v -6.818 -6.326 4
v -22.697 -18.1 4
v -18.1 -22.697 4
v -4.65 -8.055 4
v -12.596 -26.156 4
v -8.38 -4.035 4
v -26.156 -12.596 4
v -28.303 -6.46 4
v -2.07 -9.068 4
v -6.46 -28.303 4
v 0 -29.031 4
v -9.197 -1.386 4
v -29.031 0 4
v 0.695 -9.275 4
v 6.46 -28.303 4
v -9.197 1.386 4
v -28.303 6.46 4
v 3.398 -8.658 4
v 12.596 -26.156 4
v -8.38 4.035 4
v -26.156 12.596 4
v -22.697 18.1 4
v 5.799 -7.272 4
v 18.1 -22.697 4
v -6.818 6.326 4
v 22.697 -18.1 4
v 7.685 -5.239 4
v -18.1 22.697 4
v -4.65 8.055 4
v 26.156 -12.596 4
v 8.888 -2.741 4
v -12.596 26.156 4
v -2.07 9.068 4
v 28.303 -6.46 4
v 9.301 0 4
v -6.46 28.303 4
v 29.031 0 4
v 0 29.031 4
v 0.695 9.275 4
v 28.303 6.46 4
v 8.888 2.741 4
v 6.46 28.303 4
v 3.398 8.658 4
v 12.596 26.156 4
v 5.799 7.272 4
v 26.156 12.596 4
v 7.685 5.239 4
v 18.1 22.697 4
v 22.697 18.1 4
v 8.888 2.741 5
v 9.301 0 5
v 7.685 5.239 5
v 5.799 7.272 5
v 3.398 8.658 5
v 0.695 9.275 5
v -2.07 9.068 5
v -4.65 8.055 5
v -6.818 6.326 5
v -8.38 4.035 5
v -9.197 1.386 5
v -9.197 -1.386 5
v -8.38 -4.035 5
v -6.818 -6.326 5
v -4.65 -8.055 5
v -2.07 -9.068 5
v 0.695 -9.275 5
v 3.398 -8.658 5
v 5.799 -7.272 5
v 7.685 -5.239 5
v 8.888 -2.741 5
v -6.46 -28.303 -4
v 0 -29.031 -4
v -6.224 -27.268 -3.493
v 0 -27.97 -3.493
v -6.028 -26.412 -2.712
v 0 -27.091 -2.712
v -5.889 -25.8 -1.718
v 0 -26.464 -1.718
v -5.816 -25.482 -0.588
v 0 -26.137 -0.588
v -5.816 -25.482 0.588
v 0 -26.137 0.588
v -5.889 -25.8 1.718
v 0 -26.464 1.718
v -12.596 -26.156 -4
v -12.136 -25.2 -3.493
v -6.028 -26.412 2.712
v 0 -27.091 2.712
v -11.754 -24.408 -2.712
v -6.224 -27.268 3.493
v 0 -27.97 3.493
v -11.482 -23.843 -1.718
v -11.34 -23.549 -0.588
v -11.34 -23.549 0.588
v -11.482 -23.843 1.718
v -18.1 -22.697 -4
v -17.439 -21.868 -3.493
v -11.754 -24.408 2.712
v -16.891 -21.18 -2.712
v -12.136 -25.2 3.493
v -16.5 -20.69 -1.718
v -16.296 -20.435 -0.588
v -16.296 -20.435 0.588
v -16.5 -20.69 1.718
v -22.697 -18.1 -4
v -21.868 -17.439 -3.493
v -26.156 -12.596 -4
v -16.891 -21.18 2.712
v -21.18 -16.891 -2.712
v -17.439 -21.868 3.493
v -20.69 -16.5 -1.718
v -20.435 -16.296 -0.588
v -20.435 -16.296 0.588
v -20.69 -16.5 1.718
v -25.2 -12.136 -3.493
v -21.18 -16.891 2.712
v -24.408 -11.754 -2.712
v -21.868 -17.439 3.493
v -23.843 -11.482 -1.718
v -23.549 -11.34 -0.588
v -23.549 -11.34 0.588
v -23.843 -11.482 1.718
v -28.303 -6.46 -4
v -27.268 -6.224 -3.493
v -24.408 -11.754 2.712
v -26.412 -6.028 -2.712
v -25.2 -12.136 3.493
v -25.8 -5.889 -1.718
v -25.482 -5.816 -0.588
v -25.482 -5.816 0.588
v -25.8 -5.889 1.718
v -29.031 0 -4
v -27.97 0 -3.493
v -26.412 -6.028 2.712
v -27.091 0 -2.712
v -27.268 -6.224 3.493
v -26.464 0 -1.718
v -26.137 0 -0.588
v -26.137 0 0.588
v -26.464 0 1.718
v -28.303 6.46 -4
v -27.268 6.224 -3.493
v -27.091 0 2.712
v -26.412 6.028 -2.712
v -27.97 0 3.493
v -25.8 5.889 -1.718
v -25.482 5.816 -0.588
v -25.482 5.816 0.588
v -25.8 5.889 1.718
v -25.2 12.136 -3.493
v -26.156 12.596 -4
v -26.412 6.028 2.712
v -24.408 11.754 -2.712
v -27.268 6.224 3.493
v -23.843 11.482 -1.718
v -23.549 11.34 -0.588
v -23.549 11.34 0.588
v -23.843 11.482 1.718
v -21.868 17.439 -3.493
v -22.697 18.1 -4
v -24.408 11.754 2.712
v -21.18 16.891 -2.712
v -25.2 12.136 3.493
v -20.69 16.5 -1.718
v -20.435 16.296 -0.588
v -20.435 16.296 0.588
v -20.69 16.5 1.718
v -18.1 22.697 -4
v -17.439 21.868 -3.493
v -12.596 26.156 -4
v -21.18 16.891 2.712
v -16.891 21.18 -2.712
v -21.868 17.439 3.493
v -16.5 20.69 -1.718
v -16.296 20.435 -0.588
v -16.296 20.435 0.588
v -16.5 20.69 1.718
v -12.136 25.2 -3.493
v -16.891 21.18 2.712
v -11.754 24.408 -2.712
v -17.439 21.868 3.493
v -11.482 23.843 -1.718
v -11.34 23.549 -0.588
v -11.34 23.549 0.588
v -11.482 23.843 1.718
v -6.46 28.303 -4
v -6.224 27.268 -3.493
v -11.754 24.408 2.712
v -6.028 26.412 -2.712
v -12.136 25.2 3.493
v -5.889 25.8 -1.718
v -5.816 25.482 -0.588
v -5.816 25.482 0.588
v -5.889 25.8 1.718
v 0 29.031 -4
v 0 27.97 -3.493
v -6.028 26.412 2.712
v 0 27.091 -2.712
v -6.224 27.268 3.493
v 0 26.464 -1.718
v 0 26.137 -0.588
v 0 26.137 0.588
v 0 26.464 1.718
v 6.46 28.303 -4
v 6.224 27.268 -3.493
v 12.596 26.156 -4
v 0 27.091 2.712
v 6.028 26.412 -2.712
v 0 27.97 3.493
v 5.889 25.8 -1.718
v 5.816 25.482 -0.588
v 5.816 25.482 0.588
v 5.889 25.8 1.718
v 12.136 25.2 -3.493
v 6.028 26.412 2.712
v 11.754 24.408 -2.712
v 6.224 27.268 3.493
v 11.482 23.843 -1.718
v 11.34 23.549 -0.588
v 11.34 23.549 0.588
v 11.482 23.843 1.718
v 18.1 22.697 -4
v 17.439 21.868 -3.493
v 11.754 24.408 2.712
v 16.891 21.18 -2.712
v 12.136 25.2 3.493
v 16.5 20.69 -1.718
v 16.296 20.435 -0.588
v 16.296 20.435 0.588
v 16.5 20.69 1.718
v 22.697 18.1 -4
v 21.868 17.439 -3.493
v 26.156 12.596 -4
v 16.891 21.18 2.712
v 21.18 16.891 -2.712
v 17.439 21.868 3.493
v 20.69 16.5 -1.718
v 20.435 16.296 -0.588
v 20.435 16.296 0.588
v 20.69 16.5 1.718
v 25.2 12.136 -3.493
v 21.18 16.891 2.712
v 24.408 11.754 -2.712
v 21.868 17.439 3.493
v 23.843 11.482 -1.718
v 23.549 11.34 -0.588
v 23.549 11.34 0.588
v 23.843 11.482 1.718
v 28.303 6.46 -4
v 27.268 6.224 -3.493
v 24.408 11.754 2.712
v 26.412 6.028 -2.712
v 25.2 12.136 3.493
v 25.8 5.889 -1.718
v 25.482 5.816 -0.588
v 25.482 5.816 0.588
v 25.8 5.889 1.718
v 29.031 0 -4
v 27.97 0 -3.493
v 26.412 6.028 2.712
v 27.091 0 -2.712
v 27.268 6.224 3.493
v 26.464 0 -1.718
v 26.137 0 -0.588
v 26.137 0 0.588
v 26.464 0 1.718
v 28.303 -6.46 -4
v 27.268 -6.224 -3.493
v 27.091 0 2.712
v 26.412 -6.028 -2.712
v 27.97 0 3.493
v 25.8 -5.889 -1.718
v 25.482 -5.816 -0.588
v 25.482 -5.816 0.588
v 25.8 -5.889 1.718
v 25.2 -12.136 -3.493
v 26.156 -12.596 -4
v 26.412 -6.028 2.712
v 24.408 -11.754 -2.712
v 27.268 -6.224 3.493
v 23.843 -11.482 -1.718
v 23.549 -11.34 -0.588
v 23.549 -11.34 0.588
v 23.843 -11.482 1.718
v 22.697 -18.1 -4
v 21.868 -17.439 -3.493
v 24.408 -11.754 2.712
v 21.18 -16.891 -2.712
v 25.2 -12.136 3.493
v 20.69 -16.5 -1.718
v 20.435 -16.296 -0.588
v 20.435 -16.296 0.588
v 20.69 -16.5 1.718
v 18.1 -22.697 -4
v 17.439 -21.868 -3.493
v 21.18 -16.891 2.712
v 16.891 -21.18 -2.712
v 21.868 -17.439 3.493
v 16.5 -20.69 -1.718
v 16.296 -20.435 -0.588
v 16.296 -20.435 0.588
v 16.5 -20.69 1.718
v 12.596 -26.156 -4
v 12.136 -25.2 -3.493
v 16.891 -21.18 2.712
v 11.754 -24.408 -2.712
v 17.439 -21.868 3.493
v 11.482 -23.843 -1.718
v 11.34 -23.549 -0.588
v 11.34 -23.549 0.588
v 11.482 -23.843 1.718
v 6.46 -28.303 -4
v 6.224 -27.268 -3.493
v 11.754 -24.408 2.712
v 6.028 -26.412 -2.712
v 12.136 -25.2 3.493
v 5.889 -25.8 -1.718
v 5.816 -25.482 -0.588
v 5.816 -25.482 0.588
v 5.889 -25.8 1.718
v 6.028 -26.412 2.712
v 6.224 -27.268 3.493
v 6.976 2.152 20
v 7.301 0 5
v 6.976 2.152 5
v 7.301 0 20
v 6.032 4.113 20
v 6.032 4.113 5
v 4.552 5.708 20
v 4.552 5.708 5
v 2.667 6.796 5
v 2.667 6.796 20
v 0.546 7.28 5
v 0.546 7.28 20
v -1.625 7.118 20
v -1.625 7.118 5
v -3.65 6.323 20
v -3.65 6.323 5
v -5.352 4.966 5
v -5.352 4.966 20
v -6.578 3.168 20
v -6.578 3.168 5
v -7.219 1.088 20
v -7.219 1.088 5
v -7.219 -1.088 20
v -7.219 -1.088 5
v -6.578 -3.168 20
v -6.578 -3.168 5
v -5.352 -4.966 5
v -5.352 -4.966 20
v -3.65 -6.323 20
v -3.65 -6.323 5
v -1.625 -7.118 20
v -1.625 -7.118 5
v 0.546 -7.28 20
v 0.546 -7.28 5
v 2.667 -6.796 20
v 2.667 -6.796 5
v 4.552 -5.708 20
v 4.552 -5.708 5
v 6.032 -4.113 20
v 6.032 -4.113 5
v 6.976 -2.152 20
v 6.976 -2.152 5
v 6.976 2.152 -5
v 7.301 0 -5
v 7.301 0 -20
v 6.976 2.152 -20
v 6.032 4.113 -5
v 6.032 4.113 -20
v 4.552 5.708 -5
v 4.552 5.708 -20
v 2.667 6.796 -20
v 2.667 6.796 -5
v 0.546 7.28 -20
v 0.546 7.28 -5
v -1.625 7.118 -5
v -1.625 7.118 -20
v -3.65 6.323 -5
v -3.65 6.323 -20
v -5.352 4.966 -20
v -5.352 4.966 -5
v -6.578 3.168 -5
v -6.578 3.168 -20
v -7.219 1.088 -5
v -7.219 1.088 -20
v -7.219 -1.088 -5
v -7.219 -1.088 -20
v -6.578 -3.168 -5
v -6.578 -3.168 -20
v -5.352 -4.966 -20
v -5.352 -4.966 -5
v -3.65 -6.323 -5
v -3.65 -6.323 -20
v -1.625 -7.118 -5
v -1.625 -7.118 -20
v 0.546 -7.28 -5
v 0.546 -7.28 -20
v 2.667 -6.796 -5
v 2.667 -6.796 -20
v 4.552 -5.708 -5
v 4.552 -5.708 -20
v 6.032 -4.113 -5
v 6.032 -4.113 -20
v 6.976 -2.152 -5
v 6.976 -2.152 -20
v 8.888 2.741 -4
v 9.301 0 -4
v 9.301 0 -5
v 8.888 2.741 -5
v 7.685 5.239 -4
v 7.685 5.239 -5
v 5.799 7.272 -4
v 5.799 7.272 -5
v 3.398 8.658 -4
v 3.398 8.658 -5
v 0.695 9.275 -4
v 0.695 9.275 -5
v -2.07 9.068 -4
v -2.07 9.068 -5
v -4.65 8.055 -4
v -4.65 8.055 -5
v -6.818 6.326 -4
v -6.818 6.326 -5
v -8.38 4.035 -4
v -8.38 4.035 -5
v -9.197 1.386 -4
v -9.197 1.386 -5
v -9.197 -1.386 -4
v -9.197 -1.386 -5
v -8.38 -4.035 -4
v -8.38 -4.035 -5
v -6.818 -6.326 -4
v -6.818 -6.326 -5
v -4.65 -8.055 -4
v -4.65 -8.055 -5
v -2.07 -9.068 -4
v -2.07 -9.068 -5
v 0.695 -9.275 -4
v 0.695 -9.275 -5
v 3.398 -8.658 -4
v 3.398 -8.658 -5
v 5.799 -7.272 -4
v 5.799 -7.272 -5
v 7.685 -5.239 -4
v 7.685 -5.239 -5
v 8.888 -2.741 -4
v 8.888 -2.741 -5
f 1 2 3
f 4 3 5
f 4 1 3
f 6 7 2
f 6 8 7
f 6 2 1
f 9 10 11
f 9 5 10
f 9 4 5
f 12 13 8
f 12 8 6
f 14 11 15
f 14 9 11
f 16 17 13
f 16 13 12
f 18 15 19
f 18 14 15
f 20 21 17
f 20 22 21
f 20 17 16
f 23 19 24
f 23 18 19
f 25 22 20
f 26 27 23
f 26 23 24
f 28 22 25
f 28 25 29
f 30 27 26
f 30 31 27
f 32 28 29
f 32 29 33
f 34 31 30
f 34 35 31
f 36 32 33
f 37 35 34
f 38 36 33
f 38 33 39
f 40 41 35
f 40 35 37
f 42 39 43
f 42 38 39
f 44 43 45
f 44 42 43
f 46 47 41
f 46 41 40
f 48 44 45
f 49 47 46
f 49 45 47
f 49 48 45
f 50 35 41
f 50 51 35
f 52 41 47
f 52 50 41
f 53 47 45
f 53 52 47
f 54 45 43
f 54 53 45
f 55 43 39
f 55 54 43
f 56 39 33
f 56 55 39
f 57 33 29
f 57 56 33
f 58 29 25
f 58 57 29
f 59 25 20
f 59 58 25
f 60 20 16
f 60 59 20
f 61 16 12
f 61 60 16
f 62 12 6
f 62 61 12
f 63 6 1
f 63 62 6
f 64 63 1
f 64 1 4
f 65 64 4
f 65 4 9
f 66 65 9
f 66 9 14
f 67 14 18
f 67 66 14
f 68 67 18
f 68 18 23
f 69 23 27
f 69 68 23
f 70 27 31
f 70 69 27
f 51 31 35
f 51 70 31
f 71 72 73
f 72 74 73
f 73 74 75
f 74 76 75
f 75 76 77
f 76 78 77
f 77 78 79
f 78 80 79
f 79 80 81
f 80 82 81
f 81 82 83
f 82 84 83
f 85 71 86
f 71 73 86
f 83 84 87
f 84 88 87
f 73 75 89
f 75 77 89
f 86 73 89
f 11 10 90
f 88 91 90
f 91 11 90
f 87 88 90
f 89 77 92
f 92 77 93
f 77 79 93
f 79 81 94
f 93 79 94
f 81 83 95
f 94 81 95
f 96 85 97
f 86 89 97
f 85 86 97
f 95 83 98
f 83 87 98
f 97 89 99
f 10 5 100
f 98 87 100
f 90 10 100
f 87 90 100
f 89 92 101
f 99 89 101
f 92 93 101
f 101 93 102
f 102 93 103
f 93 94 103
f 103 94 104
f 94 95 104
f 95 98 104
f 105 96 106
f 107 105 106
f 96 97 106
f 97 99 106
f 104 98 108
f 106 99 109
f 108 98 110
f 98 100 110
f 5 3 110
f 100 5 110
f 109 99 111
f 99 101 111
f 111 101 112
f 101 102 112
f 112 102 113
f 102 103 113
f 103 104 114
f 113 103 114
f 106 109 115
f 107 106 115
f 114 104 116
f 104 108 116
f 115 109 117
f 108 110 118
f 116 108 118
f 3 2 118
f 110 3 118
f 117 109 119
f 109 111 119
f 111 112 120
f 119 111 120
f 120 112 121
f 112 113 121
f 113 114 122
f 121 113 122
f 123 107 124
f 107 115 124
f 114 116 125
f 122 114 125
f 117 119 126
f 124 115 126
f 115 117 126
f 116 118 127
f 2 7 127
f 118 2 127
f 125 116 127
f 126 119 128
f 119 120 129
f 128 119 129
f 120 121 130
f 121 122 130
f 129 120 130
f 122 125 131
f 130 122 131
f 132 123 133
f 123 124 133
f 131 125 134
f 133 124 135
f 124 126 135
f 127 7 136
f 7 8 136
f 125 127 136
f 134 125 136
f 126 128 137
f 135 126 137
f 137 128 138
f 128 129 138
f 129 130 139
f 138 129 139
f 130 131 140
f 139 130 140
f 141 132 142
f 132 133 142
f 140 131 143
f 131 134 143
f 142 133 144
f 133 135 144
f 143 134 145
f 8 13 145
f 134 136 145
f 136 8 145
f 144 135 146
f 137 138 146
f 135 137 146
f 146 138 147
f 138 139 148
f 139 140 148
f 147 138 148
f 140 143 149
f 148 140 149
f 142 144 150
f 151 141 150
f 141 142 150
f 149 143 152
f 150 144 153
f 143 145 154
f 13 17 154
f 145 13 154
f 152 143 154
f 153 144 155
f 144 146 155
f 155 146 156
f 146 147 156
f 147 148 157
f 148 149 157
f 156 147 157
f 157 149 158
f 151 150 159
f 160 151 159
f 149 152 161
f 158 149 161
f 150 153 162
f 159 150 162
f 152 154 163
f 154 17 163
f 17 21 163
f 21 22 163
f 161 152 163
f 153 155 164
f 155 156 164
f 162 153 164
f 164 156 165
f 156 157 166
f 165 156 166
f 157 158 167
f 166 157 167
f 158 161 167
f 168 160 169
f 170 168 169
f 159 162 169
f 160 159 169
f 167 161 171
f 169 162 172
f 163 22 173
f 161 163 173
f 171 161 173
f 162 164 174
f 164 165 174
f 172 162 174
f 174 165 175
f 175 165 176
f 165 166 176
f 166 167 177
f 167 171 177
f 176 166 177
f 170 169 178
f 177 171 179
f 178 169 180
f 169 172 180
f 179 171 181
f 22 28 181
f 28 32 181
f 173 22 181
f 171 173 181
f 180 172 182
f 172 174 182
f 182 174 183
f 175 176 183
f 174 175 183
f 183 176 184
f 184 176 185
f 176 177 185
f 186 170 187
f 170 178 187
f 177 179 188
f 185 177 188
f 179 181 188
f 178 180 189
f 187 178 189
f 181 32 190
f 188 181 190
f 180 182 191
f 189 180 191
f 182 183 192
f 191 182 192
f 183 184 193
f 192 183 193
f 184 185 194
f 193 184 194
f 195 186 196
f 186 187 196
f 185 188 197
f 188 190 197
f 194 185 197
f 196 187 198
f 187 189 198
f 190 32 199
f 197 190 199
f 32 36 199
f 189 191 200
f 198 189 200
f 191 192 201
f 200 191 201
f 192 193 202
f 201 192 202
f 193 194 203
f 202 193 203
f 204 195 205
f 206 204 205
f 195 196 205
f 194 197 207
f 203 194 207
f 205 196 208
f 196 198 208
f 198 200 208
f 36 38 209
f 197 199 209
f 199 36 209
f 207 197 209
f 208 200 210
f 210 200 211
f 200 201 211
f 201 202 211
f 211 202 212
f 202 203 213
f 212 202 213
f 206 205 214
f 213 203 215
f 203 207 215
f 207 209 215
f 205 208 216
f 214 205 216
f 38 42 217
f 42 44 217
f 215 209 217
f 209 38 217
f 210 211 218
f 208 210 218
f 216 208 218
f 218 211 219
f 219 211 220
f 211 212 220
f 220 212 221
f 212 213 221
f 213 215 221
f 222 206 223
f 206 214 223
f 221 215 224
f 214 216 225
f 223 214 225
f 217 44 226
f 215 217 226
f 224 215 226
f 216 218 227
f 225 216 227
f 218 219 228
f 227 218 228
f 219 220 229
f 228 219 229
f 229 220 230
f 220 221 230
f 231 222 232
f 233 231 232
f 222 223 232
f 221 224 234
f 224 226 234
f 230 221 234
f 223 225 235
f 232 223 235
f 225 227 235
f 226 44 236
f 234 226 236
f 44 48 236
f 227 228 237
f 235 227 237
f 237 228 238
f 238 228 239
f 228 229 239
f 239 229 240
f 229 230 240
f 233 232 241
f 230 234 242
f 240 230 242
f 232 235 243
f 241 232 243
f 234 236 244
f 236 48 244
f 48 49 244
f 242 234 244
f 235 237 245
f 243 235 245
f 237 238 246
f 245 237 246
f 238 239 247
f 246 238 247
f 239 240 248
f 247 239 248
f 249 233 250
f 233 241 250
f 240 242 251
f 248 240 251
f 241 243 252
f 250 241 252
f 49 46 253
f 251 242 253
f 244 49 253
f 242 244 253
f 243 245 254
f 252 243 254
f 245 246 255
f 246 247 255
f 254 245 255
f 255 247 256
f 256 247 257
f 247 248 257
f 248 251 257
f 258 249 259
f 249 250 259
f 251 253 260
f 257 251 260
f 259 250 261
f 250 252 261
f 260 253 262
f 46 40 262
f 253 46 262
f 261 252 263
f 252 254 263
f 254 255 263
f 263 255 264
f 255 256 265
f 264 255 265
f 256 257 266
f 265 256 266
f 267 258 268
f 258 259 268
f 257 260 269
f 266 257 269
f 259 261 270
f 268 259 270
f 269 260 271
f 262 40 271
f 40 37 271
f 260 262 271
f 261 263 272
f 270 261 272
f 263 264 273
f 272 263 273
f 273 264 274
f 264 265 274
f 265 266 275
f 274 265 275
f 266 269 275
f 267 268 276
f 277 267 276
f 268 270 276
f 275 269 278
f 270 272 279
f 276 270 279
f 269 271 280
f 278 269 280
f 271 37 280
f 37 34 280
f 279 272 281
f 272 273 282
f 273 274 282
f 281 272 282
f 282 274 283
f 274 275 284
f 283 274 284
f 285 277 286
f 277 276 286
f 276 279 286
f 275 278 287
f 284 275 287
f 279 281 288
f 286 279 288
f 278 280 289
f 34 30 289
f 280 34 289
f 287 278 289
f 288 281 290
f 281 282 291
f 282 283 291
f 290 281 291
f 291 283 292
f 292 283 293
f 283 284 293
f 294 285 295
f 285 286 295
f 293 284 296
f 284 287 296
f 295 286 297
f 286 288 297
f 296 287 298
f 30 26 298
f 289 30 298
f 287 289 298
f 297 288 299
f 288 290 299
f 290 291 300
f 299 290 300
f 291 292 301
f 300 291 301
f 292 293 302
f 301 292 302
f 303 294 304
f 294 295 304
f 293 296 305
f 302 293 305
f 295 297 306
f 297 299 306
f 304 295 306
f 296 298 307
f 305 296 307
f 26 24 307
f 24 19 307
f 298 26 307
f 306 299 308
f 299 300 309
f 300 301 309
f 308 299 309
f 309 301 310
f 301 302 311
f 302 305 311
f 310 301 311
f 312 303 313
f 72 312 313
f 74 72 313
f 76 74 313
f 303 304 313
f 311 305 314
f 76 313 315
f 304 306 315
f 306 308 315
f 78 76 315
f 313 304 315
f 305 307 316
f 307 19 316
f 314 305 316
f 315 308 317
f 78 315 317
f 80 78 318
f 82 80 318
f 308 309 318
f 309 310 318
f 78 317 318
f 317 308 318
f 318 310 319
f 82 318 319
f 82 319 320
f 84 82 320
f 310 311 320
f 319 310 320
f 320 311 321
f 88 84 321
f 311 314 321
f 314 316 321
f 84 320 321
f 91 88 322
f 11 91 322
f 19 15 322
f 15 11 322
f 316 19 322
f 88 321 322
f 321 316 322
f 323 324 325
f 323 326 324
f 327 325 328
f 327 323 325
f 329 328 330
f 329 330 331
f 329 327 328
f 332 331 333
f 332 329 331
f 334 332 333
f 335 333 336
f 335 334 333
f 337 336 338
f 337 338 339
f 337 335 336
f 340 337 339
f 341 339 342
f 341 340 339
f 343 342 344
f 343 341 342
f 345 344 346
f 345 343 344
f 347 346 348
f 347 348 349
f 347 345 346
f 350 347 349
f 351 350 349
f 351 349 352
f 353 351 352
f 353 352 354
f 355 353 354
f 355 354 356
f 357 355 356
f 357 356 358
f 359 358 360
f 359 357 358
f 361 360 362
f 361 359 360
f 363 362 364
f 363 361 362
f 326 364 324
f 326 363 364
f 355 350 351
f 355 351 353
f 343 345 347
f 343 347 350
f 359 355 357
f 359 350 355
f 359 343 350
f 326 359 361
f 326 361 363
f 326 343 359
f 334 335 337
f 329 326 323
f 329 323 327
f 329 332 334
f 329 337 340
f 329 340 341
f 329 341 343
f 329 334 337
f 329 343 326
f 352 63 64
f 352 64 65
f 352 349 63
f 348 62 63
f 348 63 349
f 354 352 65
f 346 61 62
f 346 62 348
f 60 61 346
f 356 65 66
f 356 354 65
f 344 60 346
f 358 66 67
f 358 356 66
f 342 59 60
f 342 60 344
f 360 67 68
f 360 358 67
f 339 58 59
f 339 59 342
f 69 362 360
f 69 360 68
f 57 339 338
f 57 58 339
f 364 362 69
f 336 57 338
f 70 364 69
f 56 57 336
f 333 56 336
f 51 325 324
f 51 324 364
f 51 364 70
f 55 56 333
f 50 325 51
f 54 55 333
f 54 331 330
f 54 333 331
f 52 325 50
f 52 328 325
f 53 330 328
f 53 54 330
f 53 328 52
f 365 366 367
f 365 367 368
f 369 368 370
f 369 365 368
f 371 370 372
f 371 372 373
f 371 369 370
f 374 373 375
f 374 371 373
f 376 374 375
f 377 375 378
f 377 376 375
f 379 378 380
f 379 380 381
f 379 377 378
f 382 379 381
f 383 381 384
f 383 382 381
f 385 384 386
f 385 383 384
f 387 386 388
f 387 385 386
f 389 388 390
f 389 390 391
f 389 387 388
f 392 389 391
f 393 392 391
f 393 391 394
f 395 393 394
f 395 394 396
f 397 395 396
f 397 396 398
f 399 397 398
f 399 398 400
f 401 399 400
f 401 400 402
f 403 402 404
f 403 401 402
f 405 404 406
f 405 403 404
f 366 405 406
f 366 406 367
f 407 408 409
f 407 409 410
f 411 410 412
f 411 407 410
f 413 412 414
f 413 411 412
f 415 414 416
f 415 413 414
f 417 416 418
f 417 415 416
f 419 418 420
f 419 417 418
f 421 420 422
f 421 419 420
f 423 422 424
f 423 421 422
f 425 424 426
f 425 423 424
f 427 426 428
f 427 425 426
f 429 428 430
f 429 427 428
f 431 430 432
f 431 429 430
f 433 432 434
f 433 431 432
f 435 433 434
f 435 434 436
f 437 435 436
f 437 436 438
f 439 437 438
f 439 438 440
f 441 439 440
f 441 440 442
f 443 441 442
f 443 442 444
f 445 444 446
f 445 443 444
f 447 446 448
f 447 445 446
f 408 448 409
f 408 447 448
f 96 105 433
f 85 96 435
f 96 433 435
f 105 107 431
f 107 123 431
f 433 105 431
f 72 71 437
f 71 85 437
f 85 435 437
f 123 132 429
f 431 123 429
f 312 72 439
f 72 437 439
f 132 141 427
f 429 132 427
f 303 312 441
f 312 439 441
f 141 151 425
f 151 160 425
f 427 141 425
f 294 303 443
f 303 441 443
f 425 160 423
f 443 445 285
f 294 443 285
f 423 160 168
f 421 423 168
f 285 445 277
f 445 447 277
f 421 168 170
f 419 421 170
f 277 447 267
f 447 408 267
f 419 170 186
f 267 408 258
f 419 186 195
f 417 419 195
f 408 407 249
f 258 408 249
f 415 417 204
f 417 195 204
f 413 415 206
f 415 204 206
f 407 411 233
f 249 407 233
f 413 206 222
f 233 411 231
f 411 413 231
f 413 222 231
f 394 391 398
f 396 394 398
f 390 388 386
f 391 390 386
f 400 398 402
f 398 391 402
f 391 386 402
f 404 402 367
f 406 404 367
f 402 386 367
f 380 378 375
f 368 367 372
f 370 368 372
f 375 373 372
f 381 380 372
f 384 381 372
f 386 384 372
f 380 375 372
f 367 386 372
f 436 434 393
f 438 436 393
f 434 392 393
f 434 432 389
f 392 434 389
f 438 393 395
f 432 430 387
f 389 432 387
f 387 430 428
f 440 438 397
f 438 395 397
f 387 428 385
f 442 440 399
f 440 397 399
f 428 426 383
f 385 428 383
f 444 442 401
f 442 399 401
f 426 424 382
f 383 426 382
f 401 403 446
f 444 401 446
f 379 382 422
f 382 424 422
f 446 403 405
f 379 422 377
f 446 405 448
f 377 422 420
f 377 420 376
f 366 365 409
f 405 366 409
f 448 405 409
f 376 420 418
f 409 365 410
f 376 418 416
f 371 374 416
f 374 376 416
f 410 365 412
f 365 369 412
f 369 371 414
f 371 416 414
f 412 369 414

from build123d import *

# Parameters (mm, degrees)
F0_R     = 7.3008019747
F1_DEPTH = 20
F0_R_2   = 9.3008019747
F2_DEPTH = 5
F0_R_3   = 29.0307788443
F3_DEPTH = 4


with BuildPart() as f1:
    # F0 (on Top) → F1 (new body, symmetric)
    with BuildSketch(Plane.XY):
        Circle(F0_R)
    extrude(amount=F1_DEPTH, both=True)

    # F0 (on Top) → F2 (join, symmetric)
    with BuildSketch(Plane.XY):
        Circle(F0_R_2)
        Circle(F0_R, mode=Mode.SUBTRACT)
    extrude(amount=F2_DEPTH, both=True)

    # F0 (on Top) → F3 (join, symmetric)
    with BuildSketch(Plane.XY):
        Circle(F0_R_3)
        Circle(F0_R_2, mode=Mode.SUBTRACT)
    extrude(amount=F3_DEPTH, both=True)

    # F5: sweep along a path in F5_path
    with BuildLine(Plane(origin=(29.0307788443, 0, 4), x_dir=(0, -1, 0), z_dir=(0, 0, -1))) as f5_path:
        CenterArc((0, 29.0307788443), 29.0307788443, 0, 360)
    # F4 (on Right) → F5 (sweep, cut)
    with BuildSketch(Plane.YZ):
        with BuildLine():
            Line((-29.0307788443, 4), (-29.0307788443, -4))
            ThreePointArc((-29.0307788443, -4), (-26.0956077828, 0), (-29.0307788443, 4))
        make_face()
    sweep(path=f5_path.line, mode=Mode.SUBTRACT)


solid = f1.part
